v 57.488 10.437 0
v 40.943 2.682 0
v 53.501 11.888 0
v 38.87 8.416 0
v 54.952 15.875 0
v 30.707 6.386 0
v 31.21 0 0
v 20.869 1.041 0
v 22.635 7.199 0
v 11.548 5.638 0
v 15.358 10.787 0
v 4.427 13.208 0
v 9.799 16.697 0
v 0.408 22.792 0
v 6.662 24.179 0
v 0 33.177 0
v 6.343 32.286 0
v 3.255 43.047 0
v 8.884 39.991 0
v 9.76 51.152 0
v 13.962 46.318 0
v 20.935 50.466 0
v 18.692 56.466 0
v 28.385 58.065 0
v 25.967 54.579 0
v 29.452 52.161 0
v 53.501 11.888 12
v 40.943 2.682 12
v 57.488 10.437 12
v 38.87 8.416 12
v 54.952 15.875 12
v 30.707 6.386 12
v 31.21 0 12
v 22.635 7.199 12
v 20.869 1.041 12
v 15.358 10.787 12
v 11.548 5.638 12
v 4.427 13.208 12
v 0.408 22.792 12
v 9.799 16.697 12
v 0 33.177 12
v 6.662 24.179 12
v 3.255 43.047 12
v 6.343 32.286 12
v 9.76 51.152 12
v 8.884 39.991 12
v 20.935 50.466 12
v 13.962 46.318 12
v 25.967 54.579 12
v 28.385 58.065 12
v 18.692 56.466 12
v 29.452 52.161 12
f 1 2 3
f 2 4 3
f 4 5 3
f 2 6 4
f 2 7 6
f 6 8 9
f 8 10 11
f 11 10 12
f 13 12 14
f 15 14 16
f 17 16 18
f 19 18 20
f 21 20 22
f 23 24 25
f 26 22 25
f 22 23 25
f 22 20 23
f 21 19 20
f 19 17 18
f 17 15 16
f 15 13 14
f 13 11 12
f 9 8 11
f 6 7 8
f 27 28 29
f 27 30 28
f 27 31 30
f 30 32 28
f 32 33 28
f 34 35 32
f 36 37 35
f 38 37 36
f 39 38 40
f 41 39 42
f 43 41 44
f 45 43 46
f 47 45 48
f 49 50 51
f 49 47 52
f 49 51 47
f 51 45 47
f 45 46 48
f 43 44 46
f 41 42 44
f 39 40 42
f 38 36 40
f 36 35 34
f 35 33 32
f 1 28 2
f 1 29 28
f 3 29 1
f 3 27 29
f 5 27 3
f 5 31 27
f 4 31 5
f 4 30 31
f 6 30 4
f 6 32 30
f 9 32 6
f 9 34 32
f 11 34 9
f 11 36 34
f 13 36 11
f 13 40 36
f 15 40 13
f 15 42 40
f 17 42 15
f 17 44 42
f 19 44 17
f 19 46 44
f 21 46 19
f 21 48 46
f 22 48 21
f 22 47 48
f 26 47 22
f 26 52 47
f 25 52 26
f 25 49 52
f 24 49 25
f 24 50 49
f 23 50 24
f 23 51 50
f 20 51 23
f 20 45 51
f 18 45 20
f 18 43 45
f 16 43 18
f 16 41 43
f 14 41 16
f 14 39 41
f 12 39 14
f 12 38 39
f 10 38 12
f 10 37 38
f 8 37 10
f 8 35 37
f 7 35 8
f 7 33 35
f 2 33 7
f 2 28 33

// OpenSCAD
$fn = 32;

// ----------------------------------------------------------------------
// Hook plate: curl radius 26 mm over 205 degrees, 6 mm thick band
// ----------------------------------------------------------------------

// --- parameters (mm) ---
profile_height = 12;      // extrusion height
profile_points = 26;      // points of the closed outline

profile = [[25.967, 54.579], [28.385, 58.065], [18.692, 56.466], [9.76, 51.152], [3.255, 43.047], [0, 33.177], [0.408, 22.792], [4.427, 13.208], [11.548, 5.638], [20.869, 1.041], [31.21, 0], [40.943, 2.682], [57.488, 10.437], [53.501, 11.888], [54.952, 15.875], [38.87, 8.416], [30.707, 6.386], [22.635, 7.199], [15.358, 10.787], [9.799, 16.697], [6.662, 24.179], [6.343, 32.286], [8.884, 39.991], [13.962, 46.318], [20.935, 50.466], [29.452, 52.161]];  // single closed polygon, 26 points, counter clockwise

// --- the one profile operation ---
linear_extrude(height = profile_height) polygon(points = profile);
